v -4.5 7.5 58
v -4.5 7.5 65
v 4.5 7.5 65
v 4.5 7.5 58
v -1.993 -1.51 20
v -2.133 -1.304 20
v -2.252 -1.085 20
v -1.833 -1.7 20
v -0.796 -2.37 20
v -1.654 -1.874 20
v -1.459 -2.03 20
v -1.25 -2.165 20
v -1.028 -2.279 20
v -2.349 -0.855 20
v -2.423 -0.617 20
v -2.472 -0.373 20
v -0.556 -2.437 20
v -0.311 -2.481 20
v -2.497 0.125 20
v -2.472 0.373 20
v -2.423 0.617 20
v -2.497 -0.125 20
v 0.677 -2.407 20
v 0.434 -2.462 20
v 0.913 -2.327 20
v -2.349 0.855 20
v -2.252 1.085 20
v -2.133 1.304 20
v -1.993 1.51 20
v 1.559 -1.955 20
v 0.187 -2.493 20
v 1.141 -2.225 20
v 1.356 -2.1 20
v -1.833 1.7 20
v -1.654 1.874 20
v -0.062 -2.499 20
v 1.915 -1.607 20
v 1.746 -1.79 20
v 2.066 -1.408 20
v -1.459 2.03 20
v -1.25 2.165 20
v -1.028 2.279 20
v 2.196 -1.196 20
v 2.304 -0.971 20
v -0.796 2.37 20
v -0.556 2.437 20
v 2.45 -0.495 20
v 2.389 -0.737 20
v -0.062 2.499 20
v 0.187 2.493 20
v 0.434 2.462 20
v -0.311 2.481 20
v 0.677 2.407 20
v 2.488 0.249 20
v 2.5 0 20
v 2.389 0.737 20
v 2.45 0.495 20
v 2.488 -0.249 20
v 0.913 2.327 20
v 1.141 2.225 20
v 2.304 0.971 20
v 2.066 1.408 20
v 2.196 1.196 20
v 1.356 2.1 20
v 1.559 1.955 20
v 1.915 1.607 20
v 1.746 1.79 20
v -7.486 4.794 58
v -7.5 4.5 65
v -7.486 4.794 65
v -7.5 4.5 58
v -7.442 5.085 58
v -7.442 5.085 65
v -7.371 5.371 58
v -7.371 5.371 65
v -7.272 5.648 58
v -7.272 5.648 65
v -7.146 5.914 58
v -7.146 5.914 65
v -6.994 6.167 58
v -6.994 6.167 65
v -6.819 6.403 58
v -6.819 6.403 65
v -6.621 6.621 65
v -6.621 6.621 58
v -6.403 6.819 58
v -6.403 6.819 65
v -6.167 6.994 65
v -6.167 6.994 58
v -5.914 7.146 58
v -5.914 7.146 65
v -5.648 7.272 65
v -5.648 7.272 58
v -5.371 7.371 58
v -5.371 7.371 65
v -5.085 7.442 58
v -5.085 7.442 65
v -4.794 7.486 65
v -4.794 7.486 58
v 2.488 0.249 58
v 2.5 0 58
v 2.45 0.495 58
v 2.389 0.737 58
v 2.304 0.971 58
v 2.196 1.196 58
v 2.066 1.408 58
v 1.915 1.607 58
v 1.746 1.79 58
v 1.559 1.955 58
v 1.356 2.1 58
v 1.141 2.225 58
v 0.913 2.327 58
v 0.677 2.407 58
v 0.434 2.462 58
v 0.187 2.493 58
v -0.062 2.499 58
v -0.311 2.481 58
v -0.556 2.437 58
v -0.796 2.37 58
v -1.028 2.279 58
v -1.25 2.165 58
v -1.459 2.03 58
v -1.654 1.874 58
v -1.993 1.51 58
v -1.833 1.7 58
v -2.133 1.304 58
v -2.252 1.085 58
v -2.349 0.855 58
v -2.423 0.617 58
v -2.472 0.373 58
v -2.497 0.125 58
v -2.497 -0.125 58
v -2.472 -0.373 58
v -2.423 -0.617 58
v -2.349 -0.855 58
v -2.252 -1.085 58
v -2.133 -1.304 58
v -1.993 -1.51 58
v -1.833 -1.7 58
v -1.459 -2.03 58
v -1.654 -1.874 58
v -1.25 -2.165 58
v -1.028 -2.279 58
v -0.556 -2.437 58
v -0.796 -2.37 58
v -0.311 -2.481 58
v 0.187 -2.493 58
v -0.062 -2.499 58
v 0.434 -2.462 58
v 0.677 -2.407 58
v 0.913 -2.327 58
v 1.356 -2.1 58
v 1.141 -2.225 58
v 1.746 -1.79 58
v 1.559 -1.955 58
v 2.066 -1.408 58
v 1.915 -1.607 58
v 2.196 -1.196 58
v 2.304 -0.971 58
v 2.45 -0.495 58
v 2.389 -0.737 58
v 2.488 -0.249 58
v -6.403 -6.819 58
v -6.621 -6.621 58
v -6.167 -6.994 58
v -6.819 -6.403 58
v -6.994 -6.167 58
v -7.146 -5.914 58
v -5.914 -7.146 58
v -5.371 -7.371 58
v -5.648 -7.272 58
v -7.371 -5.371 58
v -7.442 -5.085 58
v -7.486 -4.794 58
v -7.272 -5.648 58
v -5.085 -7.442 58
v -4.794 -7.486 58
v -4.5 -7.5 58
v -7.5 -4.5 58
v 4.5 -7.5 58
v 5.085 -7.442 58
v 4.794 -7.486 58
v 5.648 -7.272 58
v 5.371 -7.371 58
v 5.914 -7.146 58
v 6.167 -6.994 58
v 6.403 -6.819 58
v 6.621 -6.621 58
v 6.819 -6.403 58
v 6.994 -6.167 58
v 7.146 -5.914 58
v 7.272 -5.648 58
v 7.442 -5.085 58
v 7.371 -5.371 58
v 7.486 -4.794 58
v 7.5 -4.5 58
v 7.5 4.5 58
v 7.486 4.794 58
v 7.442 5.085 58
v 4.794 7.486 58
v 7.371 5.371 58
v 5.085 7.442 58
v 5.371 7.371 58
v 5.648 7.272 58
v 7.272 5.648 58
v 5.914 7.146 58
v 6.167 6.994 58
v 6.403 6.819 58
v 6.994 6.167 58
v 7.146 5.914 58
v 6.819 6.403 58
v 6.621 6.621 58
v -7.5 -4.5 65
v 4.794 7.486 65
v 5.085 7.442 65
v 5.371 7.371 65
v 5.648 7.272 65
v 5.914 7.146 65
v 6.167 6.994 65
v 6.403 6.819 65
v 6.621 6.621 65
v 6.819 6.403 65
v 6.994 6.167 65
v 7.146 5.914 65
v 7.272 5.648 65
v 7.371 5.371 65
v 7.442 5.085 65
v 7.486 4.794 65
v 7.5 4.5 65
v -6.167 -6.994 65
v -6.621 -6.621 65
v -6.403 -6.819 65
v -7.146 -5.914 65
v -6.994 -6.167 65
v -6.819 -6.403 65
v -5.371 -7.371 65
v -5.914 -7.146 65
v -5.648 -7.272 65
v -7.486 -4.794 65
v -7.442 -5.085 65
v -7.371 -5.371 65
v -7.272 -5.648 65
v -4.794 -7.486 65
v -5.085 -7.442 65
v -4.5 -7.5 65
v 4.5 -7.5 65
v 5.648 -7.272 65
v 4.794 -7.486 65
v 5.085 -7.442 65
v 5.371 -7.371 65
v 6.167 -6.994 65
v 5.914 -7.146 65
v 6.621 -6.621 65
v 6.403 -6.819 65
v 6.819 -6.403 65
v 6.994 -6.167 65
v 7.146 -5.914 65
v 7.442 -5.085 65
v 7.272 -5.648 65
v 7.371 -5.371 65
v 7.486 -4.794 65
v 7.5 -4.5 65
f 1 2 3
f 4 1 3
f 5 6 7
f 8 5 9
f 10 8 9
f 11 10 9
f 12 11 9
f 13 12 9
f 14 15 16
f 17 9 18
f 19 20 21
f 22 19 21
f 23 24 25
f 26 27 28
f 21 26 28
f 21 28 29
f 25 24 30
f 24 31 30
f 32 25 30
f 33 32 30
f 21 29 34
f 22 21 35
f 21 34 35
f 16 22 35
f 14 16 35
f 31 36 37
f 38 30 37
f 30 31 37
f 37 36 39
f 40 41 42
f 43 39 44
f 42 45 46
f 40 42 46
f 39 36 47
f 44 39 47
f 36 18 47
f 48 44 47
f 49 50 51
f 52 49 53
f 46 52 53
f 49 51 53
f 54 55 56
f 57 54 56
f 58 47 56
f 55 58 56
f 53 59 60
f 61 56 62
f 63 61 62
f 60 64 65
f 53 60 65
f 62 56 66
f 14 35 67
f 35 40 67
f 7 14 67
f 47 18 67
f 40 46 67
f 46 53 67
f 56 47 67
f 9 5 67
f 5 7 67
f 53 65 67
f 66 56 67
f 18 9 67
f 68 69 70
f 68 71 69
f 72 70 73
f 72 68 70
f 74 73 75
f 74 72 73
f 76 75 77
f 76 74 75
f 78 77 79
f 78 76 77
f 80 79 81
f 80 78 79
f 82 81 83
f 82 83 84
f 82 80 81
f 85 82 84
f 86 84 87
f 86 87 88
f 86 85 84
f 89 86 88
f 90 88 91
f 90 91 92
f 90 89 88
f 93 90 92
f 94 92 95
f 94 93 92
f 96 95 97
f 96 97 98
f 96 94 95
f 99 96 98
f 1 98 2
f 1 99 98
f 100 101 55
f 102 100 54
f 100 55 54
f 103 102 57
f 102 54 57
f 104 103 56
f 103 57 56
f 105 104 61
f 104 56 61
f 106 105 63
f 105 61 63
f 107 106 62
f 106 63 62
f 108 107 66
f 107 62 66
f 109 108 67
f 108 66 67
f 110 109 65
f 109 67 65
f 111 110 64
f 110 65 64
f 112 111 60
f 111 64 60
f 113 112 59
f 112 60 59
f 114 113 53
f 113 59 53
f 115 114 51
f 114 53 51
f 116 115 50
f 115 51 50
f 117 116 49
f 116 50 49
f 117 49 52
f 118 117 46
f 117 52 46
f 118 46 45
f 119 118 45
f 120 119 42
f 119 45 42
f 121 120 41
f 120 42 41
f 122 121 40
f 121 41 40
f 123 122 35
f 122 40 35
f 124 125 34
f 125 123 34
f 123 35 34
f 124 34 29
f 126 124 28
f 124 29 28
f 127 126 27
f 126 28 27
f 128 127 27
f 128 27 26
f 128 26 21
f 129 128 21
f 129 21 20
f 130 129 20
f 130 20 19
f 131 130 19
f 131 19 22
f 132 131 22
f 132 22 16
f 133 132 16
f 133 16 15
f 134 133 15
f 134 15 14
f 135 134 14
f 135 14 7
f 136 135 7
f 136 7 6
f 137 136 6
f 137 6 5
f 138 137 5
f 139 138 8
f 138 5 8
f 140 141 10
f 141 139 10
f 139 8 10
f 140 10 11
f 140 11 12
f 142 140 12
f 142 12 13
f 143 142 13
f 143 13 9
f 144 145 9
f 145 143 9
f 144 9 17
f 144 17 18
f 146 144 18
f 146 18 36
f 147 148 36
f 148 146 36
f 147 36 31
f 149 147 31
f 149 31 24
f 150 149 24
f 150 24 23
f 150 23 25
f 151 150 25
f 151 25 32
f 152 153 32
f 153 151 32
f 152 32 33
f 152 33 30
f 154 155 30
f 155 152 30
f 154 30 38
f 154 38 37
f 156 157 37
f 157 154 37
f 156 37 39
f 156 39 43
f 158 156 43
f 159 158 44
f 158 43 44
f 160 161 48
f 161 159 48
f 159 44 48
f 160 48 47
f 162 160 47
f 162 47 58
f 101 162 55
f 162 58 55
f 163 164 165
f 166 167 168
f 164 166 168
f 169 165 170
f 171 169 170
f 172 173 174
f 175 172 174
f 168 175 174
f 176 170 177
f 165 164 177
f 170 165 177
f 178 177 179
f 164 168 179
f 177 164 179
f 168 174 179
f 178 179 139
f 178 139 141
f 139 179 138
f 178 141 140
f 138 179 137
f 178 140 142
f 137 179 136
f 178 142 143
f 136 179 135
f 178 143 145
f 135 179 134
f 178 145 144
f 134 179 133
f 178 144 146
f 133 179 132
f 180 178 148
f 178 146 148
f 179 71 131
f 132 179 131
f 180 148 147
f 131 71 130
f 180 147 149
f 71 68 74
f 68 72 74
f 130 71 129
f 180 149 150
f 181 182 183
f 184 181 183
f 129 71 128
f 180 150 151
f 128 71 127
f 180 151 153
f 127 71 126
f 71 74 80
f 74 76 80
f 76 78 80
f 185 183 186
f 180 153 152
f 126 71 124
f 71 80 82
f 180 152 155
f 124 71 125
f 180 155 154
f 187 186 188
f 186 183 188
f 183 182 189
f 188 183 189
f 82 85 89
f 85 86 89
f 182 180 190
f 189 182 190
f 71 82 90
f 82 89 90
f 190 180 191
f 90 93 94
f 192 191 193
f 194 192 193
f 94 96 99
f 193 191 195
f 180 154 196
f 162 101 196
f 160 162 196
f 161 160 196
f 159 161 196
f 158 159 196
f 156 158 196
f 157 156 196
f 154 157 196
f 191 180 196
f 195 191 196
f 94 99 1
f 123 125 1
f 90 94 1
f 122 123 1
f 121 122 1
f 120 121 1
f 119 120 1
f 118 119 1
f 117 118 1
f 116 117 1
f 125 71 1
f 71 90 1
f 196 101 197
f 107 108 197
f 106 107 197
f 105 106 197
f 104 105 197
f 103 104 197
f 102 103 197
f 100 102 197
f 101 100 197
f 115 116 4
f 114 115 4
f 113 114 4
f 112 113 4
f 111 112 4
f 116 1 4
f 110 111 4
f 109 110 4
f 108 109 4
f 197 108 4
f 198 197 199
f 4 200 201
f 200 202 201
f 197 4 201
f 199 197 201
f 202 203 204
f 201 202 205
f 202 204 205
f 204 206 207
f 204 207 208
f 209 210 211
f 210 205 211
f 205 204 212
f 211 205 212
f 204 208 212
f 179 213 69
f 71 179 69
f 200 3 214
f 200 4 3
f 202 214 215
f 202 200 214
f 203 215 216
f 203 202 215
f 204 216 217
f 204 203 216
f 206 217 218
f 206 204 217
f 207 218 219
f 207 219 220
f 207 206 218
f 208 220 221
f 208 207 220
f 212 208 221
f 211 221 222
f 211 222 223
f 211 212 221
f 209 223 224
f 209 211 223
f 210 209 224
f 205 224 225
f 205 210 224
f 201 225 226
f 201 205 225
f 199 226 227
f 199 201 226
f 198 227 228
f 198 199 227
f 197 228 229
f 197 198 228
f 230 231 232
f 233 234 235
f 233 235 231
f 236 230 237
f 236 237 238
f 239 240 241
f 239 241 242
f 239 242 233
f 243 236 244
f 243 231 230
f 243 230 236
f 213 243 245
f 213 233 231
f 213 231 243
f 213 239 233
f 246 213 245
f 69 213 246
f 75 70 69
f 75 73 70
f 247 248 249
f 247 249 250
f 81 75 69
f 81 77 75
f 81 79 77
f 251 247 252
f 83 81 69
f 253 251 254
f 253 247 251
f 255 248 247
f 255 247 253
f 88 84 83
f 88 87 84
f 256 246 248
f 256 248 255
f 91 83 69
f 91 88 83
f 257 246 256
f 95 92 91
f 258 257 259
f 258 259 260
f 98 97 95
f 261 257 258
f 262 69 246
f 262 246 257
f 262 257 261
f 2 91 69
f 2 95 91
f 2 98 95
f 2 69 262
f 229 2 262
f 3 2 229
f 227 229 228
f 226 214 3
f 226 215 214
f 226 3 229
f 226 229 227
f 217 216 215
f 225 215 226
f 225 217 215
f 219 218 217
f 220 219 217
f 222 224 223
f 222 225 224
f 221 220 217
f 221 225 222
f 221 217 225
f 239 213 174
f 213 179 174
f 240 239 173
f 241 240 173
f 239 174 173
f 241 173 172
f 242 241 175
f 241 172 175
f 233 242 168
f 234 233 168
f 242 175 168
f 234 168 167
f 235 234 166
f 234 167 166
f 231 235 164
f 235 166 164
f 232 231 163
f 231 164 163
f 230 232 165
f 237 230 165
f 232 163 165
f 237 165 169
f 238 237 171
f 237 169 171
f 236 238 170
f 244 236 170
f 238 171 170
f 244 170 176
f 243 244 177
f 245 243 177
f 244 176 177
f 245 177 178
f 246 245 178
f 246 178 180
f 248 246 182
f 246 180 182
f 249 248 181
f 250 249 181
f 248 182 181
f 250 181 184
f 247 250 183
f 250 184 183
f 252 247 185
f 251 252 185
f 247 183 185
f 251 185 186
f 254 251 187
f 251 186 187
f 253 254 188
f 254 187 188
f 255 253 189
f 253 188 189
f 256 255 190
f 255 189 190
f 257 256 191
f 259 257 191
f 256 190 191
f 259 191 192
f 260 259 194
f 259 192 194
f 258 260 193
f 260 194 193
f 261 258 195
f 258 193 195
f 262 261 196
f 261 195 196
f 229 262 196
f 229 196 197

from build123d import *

# Parameters (mm, degrees)
SKETCH138_R  = 2.5
PAD069_DEPTH = 45
SKETCH139_W  = 15
SKETCH139_H  = 15
PAD070_DEPTH = 7
FILLET_R     = 3


with BuildPart() as part:
    # Sketch138 → Pad069 (new body)
    with BuildSketch(Plane.XY):
        Circle(SKETCH138_R)
    extrude(amount=PAD069_DEPTH)

    # Sketch139 (on Face3 of Pad069) → Pad070 (join)
    with BuildSketch(Plane.XY.offset(45)):
        Rectangle(SKETCH139_W, SKETCH139_H)
    extrude(amount=-PAD070_DEPTH)

    # Fillet
    fillet_edges = [part.edges().sort_by_distance(p)[0] for p in [
        (7.5, -7.5, 41.5),
        (7.5, 7.5, 41.5),
        (-7.5, 7.5, 41.5),
        (-7.5, -7.5, 41.5),
    ]]
    fillet(fillet_edges, radius=FILLET_R)


with BuildPart() as part_1:
    # Body040 placement: moved
    add(part.part.moved(Location((0, 0, 20))))


solid = part_1.part
